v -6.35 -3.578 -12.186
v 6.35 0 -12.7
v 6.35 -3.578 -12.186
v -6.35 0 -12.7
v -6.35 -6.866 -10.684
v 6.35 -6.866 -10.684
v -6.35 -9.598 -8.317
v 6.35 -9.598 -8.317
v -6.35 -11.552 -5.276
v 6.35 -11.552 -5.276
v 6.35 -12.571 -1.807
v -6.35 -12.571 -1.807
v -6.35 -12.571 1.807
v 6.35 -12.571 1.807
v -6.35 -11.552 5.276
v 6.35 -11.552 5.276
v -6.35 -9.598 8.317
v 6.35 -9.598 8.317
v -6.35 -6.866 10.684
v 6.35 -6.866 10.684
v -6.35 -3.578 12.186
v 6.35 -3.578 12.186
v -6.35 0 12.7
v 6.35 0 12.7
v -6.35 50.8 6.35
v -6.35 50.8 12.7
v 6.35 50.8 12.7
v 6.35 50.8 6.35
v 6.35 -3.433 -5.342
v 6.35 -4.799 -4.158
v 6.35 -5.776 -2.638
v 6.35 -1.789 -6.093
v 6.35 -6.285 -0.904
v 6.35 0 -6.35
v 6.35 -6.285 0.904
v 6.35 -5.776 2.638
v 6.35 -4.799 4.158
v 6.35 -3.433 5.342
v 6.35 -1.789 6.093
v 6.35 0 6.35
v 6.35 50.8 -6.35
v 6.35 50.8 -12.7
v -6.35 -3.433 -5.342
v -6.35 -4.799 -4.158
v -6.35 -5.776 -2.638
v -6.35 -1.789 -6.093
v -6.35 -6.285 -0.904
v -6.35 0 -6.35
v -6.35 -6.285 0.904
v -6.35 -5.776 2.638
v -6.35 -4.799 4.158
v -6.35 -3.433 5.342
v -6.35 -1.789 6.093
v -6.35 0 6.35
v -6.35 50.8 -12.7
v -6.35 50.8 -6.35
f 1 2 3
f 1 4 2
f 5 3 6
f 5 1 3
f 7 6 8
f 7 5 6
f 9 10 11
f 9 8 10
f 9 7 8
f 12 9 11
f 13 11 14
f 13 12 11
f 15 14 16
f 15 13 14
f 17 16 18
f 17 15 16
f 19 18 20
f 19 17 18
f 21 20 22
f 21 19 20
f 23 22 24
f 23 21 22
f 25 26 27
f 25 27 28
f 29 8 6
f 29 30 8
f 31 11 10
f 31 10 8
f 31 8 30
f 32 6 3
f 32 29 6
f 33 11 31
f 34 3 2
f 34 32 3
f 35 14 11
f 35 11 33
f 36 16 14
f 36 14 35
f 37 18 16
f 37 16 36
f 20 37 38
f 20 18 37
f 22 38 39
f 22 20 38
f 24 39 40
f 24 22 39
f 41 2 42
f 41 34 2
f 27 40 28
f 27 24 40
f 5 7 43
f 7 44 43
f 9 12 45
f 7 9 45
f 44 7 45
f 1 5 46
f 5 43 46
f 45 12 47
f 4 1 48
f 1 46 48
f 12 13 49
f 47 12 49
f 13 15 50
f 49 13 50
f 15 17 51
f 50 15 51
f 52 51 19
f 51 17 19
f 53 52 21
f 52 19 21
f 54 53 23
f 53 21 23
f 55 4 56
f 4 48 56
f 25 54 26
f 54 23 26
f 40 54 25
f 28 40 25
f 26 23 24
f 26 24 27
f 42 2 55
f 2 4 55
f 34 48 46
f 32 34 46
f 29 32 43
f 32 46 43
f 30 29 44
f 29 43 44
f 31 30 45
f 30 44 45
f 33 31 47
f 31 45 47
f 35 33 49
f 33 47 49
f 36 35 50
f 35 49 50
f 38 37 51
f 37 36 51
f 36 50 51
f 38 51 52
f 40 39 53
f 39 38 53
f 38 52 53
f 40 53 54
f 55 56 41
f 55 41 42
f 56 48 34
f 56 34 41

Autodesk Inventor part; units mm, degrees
ref_plane "YZ Plane" through (0, 0, 0) normal (1, 0, 0) x (0, 1, 0)
ref_plane "XZ Plane" through (0, 0, 0) normal (0, 1, 0) x (-1, 0, 0)
ref_plane "XY Plane" through (0, 0, 0) normal (0, 0, 1) x (1, 0, 0)
sketch "Sketch1" plane through (0, 0, 0) normal (1, 0, 0) x (0, 1, 0)
  arc A0 (0, 6.35) -> (0, -6.35) centre (0, 0) ccw
  arc A1 (0, 12.7) -> (0, -12.7) centre (0, 0) ccw
  line L0 (0, 12.7) -> (50.8, 12.7)
  line L1 (0, -12.7) -> (50.8, -12.7)
  line L2 (0, 6.35) -> (50.8, 6.35)
  line L3 (0, -6.35) -> (50.8, -6.35)
  line L4 (50.8, -6.35) -> (50.8, -12.7)
  line L5 (50.8, 12.7) -> (50.8, 6.35)
  dimension "d0" = 12.7
  dimension "d1" = 25.4
  dimension "d2" = 50.8
extrude "Extrusion1" add sketch "Sketch1" along normal mid plane 12.7
properties part number "U_bolt"
